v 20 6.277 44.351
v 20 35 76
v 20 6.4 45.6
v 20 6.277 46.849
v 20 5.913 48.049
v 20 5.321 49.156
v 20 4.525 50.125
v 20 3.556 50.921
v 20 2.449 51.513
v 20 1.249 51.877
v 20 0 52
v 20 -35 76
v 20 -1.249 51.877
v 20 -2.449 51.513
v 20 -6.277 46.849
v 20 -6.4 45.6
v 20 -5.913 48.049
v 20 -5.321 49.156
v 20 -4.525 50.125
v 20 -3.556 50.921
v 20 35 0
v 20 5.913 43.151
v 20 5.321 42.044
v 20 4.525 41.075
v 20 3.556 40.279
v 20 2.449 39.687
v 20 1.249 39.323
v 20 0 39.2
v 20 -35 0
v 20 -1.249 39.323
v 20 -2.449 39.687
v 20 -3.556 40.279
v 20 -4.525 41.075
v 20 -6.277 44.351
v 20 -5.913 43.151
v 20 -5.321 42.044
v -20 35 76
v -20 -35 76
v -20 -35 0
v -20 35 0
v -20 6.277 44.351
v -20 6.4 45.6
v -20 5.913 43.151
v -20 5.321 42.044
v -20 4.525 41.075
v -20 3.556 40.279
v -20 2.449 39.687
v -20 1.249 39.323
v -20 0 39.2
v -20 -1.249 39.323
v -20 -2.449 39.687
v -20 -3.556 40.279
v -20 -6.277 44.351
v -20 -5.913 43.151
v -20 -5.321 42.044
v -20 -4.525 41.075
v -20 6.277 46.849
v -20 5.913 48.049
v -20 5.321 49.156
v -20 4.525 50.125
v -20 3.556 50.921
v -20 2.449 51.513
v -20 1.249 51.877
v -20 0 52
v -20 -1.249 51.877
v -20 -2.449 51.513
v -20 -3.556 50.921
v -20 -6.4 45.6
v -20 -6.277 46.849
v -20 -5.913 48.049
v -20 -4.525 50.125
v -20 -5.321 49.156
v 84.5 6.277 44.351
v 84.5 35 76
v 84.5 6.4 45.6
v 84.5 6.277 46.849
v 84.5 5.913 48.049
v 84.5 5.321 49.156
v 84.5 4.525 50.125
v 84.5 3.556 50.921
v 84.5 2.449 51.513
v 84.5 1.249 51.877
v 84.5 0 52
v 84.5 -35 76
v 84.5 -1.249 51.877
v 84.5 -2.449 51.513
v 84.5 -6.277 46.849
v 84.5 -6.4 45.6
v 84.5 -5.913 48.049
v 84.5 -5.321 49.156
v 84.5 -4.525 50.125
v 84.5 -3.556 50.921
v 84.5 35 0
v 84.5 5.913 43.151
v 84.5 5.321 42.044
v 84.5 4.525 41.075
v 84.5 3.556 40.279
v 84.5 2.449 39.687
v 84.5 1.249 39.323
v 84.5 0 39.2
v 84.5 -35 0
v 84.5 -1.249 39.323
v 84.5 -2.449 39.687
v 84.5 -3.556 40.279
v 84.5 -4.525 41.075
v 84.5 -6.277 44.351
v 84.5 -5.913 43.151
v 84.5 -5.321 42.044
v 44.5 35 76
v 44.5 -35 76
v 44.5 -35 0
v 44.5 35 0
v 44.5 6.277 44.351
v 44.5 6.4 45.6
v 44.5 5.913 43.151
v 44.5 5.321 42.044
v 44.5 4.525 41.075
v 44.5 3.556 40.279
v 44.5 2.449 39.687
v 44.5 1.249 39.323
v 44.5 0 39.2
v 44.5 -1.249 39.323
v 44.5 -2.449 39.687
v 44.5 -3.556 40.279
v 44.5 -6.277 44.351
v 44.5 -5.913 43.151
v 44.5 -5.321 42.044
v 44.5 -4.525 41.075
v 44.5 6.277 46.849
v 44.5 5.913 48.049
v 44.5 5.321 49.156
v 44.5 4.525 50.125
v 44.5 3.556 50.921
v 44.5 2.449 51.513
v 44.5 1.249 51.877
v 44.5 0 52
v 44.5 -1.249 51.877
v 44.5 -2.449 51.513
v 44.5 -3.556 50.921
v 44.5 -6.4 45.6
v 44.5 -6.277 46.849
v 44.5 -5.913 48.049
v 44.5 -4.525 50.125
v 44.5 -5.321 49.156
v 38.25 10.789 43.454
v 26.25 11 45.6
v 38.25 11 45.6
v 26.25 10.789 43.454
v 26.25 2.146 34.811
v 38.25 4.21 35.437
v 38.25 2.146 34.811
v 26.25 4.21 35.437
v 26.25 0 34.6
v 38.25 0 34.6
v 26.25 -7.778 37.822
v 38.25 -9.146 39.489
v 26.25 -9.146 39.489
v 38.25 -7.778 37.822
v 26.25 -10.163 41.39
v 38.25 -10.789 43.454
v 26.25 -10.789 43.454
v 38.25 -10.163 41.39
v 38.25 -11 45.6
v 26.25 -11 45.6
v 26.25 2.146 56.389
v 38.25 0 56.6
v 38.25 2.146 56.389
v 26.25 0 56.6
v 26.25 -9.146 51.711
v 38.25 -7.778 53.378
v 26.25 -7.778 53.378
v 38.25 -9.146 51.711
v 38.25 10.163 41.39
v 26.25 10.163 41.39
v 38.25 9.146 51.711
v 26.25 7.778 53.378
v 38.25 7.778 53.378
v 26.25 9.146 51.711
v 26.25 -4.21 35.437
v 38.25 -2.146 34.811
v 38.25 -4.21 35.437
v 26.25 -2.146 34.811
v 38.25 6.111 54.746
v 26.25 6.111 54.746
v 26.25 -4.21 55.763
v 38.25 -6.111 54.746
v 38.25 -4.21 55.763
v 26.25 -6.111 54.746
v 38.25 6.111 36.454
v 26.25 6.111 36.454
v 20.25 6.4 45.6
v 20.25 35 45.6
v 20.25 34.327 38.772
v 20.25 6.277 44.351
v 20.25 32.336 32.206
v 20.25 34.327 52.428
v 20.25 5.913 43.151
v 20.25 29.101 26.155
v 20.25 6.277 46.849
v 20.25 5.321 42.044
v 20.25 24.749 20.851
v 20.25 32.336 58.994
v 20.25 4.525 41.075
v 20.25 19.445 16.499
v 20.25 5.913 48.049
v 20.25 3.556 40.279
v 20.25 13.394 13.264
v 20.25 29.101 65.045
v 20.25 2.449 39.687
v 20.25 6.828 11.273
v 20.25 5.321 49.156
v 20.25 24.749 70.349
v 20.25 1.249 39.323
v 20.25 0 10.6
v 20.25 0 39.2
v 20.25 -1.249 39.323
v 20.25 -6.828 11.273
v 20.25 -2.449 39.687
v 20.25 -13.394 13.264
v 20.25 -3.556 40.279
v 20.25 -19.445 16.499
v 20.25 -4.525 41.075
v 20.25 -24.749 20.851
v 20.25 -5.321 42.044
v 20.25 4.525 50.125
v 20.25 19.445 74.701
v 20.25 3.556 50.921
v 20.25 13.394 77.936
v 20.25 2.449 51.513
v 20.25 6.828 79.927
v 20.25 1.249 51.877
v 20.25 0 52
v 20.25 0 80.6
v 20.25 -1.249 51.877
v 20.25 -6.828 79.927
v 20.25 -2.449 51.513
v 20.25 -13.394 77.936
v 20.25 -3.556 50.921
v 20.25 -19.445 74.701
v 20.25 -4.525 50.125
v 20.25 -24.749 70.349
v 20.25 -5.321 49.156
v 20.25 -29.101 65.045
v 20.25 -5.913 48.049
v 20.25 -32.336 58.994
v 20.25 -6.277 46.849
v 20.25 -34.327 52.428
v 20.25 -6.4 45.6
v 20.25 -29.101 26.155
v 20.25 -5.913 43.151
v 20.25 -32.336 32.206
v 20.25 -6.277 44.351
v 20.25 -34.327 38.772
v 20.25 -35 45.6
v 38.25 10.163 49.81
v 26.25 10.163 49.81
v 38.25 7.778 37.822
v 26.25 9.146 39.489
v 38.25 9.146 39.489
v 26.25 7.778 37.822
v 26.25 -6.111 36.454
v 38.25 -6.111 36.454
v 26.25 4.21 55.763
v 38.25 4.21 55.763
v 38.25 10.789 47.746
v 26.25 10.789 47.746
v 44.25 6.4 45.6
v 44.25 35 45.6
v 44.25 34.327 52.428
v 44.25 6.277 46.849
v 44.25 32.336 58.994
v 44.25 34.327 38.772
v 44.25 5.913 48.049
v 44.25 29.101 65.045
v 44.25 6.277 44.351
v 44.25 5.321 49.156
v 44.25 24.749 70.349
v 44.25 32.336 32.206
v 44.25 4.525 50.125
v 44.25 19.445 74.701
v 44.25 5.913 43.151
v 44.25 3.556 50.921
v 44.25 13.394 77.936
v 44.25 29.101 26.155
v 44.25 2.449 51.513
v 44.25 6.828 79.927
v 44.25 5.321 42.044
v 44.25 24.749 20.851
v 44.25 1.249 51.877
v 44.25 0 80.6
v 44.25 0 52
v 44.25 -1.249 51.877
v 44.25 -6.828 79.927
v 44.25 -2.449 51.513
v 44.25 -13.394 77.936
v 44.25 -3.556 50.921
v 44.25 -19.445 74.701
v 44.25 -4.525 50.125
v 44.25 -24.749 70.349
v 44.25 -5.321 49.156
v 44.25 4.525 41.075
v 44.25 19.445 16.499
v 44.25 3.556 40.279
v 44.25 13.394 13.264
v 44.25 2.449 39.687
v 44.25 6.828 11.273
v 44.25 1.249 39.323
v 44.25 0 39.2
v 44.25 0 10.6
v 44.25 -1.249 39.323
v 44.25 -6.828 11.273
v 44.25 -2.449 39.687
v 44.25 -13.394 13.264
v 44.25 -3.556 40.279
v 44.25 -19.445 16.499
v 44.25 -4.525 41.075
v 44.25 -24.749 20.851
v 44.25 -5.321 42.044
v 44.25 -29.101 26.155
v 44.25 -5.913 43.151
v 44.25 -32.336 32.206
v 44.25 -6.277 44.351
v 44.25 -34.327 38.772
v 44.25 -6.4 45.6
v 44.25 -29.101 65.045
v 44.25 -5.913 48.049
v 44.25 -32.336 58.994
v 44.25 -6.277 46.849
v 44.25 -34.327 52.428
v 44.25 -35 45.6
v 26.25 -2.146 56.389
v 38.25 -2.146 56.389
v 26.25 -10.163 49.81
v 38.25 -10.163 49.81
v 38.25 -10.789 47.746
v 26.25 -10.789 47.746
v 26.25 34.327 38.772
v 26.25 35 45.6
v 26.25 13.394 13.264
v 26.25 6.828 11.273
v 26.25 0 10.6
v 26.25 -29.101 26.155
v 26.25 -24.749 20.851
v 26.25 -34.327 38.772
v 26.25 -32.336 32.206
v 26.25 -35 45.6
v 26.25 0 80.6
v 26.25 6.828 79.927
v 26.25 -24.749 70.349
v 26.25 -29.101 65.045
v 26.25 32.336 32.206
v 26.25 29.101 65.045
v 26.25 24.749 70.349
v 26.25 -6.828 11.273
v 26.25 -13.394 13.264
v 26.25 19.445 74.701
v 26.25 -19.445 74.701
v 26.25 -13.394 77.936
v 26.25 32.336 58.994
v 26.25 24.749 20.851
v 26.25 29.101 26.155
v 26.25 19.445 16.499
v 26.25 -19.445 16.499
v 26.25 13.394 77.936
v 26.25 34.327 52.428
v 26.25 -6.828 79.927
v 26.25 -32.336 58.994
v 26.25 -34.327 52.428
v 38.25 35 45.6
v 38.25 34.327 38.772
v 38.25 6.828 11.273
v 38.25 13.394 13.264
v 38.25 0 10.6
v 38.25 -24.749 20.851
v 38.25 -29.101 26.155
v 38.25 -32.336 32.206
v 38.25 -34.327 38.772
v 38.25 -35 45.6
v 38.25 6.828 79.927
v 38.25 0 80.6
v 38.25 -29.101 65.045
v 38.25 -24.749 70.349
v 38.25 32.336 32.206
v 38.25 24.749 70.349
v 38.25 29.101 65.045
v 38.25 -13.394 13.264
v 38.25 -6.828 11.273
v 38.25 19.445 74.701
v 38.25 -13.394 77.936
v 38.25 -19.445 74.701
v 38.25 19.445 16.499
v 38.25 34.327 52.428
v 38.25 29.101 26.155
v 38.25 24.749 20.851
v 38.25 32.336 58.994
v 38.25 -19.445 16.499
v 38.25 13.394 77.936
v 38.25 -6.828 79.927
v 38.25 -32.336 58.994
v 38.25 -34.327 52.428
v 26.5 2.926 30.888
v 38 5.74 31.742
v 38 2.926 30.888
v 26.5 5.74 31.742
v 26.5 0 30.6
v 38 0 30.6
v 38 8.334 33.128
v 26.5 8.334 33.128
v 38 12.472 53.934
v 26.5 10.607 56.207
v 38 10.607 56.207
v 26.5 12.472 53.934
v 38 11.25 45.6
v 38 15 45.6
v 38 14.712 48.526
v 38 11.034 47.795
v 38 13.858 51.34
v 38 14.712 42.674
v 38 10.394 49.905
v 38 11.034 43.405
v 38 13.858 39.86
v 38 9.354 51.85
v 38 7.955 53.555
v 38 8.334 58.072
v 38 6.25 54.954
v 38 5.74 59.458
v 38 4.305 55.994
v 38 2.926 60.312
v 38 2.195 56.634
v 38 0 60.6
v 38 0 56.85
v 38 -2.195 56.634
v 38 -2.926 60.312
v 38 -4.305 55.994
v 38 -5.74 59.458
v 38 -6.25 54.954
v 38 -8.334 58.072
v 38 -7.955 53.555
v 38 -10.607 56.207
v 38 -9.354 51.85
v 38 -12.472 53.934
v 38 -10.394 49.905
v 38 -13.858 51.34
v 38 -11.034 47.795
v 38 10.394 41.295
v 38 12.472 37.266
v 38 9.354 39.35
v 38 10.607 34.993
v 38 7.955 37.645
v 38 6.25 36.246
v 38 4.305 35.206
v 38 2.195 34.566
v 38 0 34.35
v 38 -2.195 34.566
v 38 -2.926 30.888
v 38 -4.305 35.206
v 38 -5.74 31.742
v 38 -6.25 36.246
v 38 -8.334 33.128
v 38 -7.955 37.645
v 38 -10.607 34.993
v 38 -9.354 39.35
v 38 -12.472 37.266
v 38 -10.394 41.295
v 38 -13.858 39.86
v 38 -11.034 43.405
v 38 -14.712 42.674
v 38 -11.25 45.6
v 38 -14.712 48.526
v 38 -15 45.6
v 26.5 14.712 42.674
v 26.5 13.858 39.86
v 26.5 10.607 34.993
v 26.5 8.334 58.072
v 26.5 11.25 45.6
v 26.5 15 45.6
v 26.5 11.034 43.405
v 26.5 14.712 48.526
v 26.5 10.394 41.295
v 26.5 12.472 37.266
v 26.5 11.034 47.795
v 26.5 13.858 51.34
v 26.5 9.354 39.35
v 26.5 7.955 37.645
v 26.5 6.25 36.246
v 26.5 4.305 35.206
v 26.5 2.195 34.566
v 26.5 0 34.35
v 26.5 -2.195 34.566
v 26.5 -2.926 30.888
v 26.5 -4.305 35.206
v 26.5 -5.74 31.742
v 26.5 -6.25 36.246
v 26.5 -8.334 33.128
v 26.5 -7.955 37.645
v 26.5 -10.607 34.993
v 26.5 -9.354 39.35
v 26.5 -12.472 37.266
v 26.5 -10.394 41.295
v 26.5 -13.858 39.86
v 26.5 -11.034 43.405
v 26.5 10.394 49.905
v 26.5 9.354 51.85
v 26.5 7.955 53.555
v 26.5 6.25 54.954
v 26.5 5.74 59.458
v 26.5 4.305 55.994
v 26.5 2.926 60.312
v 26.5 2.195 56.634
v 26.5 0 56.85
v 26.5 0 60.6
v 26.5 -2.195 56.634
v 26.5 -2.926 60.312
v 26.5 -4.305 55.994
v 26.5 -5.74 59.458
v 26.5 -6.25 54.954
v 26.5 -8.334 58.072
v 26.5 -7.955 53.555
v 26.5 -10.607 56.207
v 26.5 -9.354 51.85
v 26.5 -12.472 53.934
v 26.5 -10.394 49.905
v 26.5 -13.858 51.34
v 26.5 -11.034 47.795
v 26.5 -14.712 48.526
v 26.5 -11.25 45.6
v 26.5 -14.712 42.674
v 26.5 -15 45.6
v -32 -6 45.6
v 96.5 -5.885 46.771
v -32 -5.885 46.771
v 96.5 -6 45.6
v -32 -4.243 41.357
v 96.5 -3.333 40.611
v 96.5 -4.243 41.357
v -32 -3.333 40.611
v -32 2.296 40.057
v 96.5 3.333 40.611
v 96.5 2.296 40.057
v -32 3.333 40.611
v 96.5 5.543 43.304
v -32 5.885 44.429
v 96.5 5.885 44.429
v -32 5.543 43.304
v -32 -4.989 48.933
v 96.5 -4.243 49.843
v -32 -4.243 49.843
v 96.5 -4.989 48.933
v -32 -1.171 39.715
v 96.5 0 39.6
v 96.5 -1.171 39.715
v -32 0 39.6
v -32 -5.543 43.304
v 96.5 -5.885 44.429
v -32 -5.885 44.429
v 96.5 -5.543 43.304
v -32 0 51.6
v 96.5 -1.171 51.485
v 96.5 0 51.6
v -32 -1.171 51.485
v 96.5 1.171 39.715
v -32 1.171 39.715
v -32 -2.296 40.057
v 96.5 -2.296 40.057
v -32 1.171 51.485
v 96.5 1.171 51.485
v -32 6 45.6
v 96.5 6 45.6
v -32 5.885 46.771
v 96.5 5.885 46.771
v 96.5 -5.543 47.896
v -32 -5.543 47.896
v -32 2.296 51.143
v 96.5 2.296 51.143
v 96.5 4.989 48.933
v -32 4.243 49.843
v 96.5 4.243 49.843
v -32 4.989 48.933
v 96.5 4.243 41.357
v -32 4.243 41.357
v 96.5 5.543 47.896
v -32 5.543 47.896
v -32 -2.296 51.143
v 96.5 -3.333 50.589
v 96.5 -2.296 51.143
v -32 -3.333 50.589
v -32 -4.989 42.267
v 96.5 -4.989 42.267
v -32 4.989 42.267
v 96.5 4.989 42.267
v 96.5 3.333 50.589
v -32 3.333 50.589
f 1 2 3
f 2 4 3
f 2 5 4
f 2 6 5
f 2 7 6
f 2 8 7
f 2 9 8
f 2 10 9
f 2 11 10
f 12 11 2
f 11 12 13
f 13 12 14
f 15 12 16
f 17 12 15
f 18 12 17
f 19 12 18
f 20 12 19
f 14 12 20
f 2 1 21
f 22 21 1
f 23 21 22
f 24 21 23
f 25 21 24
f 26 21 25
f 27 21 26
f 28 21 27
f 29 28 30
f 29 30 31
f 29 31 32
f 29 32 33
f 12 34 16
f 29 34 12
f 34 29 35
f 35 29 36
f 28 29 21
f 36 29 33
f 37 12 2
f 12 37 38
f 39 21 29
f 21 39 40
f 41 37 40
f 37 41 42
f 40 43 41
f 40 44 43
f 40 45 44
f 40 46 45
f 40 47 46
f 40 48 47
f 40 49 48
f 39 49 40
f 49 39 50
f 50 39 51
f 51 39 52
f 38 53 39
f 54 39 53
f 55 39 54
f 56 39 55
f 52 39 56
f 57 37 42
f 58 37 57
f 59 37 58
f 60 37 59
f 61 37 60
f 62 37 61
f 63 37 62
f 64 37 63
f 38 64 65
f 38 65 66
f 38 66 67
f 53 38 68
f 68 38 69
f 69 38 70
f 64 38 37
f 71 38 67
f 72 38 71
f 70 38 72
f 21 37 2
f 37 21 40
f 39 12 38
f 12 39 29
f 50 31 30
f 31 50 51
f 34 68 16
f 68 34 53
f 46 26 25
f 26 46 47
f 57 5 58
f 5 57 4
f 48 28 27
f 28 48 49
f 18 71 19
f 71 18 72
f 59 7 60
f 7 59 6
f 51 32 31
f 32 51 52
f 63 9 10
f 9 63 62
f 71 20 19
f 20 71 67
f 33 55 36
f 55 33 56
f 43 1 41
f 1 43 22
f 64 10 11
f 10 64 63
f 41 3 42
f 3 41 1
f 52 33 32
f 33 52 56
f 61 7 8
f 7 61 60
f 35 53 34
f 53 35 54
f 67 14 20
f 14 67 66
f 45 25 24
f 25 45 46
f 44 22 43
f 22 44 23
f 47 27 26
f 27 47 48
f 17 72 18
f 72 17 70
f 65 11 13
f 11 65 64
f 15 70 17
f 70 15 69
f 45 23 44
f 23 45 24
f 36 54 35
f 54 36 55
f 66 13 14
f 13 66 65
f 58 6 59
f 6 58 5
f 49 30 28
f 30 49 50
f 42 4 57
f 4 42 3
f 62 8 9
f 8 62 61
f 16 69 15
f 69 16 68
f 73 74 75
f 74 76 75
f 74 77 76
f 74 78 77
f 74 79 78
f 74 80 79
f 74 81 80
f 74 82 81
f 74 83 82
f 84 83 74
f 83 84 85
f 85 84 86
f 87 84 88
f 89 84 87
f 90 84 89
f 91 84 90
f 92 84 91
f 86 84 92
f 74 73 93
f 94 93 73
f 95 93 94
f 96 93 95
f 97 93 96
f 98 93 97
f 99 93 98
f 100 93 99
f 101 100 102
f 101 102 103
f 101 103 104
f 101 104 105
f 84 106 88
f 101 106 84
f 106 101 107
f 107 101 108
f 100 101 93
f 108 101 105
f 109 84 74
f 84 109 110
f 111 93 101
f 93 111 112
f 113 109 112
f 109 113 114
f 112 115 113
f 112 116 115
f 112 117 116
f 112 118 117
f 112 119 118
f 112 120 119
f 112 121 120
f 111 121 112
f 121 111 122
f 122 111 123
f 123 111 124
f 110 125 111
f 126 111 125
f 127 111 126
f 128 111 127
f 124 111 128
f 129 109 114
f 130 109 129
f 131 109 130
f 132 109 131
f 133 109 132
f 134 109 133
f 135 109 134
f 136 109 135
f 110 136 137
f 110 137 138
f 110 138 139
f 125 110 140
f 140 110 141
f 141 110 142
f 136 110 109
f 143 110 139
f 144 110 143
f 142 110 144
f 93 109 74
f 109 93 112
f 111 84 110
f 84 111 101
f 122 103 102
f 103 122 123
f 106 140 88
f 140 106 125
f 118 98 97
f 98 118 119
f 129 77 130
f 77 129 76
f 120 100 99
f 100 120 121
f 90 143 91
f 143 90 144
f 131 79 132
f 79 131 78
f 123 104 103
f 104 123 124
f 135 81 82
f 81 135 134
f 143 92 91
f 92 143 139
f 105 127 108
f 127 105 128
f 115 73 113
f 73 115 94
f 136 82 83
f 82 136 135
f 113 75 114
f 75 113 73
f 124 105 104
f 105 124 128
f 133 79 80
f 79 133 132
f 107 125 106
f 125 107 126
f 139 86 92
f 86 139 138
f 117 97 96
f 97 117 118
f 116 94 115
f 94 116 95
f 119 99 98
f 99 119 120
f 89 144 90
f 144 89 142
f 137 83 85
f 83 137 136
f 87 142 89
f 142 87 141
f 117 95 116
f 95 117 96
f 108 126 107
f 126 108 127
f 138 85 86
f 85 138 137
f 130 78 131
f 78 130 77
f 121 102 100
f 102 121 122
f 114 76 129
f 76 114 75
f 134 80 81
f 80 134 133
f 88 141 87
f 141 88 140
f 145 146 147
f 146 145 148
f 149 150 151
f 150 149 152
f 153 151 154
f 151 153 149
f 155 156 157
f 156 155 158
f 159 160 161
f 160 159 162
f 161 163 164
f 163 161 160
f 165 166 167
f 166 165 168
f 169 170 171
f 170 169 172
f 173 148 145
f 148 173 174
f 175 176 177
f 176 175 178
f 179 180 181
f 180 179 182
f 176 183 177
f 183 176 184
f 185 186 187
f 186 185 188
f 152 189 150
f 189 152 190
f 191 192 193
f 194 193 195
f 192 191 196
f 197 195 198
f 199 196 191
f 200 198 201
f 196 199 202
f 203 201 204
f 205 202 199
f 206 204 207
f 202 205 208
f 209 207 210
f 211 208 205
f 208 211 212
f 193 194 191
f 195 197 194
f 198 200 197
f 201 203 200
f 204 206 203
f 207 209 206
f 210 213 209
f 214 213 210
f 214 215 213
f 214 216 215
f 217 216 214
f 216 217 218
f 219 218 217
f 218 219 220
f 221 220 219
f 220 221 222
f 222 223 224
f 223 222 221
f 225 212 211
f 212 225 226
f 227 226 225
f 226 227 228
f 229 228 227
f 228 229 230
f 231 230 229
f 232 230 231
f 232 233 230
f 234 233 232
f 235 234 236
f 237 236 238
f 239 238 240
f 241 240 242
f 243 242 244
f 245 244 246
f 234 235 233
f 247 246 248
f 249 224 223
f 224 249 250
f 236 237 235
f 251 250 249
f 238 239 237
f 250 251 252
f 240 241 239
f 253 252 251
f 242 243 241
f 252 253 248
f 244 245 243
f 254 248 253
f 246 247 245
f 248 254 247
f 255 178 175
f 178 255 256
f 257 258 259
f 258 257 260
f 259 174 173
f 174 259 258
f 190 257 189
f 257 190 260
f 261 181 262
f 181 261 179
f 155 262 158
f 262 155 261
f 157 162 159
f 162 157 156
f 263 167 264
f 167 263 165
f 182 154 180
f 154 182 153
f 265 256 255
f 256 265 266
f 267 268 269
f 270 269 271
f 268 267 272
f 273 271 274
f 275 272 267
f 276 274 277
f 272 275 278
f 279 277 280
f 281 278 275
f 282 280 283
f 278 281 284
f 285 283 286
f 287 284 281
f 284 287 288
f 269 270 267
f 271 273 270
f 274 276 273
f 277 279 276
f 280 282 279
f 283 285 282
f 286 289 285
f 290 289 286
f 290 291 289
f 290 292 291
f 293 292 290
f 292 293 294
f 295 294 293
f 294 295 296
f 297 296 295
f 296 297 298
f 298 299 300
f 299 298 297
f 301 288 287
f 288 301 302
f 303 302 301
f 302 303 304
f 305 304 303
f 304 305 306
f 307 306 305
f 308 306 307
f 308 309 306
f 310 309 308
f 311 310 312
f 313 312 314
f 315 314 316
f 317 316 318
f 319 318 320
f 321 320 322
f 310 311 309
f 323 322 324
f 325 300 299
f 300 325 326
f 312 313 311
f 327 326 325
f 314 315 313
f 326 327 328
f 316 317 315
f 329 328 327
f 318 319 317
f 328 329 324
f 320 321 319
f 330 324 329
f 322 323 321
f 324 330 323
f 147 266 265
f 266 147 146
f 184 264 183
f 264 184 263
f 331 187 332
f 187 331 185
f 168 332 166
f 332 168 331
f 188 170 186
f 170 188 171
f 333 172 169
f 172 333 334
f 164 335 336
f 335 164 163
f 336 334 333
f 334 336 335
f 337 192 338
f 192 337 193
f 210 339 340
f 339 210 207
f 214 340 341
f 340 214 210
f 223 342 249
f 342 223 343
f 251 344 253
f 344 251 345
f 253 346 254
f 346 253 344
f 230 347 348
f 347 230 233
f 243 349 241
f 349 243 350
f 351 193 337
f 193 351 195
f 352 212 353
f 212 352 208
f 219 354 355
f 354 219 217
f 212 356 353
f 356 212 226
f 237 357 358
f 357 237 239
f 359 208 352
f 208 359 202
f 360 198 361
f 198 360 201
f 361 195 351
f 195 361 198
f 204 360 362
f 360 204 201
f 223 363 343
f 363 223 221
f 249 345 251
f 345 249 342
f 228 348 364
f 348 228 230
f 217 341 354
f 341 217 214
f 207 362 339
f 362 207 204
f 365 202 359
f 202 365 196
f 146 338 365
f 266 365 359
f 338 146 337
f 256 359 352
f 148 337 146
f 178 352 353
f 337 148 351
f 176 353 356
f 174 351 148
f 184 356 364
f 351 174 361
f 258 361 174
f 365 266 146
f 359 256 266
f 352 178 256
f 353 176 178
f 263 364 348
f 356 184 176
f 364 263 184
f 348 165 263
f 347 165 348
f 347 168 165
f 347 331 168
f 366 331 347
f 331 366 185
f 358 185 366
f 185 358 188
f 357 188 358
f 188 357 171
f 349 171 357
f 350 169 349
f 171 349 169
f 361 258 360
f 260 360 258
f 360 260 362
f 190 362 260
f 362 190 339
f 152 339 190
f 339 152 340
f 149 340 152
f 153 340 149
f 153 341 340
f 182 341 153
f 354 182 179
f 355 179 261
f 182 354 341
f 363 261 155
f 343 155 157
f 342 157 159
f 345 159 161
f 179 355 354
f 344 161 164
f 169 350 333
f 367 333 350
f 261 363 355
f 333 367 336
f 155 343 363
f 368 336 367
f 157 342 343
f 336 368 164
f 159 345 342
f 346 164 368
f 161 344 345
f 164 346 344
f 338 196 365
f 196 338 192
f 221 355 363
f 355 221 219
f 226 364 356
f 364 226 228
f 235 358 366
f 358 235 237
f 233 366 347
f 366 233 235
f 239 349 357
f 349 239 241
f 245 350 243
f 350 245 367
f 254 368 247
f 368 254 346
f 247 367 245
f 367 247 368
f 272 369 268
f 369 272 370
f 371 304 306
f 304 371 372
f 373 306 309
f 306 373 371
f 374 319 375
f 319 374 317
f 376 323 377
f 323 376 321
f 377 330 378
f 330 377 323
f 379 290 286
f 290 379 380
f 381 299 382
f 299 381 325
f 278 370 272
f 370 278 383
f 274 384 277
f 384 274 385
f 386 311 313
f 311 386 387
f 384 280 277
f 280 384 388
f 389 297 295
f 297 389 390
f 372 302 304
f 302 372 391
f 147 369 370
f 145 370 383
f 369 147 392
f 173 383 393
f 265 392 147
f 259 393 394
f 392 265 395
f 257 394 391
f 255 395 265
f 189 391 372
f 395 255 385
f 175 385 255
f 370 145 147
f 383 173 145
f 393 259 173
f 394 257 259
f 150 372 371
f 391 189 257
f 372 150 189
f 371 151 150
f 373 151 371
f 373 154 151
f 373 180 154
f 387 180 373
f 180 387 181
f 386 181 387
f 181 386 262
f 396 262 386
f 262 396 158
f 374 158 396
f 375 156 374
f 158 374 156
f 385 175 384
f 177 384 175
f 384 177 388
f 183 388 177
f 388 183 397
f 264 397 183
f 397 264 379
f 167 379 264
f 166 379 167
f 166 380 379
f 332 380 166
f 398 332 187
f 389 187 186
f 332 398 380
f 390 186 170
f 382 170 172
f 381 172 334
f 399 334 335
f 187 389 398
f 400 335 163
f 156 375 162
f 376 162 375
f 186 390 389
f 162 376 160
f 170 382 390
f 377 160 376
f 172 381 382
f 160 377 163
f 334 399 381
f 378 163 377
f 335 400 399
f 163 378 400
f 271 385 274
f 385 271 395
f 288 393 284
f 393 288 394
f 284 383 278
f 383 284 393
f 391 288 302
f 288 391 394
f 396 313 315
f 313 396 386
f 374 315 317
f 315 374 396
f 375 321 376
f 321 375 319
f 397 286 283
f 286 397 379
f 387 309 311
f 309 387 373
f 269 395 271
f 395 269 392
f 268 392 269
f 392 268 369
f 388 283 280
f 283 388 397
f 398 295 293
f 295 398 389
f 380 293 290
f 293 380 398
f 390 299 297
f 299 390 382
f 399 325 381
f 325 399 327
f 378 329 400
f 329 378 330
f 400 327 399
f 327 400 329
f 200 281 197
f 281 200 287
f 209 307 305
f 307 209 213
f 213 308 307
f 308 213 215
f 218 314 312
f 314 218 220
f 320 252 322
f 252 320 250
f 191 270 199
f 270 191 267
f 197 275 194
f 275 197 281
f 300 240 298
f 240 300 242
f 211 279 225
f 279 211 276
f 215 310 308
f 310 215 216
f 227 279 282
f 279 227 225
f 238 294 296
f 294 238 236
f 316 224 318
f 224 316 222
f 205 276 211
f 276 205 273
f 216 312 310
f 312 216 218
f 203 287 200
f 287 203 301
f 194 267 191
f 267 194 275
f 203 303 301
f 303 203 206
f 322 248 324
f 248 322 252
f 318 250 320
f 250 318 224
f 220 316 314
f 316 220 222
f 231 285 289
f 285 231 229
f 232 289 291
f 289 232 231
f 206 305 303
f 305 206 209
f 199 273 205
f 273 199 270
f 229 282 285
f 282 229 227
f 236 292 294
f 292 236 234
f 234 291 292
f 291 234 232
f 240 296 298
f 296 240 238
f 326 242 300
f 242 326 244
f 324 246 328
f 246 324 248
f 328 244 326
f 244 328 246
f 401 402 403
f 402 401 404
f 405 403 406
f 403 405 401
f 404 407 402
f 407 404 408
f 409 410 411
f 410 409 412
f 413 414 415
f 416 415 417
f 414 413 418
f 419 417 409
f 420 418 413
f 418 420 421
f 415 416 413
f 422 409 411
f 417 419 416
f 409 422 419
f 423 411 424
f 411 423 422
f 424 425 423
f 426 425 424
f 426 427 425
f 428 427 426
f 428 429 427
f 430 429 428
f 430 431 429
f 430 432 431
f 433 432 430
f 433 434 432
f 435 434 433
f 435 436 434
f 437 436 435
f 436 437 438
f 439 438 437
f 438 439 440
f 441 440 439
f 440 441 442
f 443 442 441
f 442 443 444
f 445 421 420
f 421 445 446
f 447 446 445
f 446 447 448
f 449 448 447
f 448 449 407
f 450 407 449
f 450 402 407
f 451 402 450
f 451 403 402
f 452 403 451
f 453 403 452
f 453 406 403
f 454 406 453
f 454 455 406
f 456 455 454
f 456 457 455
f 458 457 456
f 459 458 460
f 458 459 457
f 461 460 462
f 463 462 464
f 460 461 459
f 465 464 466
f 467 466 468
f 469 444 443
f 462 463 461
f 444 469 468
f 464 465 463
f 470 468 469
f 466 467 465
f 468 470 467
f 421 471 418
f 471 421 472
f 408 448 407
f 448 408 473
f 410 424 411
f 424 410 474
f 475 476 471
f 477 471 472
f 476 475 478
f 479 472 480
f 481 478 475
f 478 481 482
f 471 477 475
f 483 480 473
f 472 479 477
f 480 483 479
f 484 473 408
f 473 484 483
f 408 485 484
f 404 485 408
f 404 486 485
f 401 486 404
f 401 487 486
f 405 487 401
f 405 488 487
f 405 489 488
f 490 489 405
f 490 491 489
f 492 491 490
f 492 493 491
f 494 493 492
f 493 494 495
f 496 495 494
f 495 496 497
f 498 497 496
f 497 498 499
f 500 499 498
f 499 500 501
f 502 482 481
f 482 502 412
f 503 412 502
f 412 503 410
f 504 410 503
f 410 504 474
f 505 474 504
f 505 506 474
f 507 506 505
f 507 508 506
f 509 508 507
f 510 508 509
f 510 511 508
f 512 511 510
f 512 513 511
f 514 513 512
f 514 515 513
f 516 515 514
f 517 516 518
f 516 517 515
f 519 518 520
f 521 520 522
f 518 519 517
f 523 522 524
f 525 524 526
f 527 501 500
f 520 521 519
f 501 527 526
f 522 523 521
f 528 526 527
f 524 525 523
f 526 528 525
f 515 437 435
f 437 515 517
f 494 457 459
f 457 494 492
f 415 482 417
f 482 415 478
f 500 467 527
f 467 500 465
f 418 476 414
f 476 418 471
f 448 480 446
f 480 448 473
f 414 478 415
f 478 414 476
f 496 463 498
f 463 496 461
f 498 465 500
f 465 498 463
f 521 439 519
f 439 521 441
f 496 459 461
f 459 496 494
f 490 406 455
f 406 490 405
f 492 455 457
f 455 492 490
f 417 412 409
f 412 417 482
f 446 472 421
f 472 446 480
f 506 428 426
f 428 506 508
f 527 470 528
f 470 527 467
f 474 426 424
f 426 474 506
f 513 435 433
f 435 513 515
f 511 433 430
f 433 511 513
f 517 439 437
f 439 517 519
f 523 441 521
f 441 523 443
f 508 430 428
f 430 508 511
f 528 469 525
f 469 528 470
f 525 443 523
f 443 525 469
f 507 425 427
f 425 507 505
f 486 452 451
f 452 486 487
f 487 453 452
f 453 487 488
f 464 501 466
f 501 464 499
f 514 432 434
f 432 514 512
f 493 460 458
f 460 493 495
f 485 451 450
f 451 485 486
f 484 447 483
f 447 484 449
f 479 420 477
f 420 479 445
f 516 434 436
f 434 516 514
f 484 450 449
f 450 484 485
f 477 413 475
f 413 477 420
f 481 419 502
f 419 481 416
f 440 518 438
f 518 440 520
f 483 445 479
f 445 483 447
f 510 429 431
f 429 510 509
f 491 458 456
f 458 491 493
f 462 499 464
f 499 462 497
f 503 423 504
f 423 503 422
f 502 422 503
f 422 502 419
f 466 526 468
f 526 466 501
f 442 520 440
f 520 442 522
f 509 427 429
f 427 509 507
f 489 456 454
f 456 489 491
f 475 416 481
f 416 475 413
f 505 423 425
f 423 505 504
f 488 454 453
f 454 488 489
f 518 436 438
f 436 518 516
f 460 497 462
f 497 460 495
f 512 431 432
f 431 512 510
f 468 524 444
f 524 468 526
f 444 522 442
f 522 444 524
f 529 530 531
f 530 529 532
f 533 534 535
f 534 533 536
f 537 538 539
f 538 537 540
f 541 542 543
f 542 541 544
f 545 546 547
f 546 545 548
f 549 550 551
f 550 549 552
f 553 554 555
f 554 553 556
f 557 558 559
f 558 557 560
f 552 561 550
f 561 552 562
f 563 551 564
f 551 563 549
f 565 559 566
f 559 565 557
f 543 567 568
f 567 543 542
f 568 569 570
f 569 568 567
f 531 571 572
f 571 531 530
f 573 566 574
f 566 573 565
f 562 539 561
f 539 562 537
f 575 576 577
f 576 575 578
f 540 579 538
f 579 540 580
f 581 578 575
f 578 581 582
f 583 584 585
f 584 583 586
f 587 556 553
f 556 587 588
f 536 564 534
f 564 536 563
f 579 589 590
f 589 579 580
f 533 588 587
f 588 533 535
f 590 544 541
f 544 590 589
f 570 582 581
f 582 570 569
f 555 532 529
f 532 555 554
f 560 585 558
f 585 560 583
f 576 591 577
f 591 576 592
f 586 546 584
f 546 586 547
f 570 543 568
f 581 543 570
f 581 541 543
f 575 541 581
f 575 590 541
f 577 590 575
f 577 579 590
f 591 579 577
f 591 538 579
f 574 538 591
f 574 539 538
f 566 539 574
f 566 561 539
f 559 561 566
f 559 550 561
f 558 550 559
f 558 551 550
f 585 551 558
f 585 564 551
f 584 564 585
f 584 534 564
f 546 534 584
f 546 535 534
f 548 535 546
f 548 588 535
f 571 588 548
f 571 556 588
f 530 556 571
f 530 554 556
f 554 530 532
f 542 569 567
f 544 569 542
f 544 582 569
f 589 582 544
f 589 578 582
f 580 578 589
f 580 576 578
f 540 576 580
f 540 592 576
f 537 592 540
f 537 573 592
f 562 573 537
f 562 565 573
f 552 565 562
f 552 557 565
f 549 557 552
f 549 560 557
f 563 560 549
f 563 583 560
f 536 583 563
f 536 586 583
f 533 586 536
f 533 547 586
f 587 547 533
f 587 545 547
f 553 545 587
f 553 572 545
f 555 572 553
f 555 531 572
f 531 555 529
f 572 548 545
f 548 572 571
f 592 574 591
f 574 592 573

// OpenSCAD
$fn = 32;

// ------------------------------------------------------------------------
// Pulley assembly: d70 pulley with a belt, shaft d12
// Every part is its own module, assembly() places them once.
// ------------------------------------------------------------------------

// --- part 1 ---
module support1() {
  difference() {
    translate([-20, -35, 0]) cube([40, 70, 76]);
    translate([0, 0, 45.6]) rotate([0, 90, 0]) cylinder(h = 42, d = 12.8, center = true);
  }
}

// --- part 2 ---
module support2() {
  difference() {
    translate([-20, -35, 0]) cube([40, 70, 76]);
    translate([0, 0, 45.6]) rotate([0, 90, 0]) cylinder(h = 42, d = 12.8, center = true);
  }
}

// --- part 3 ---
module shaft() {
  translate([0, 0, -64.25]) cylinder(h = 128.5, d = 12);
}

// --- part 4 ---
module pulley() {
  difference() {
    union() {
      cylinder(h = 24, d = 22);
      cylinder(h = 6, d = 70);
      translate([0, 0, 18]) cylinder(h = 6, d = 70);
    }
    translate([0, 0, -1]) cylinder(h = 26, d = 12.8);
  }
}

// --- part 5 ---
module belt() {
  difference() {
      translate([0, 0, 0]) cylinder(h = 11.5, d = 30);
      translate([0, 0, -1]) cylinder(h = 13.5, d = 22.5);
    }
}

// --- assembly ---
module assembly() {
  translate([0, 0, 0]) rotate([0, 0, 0]) support1();
  translate([64.5, 0, 0]) rotate([0, 0, 0]) support2();
  translate([32.25, 0, 45.6]) rotate([0, 90, 0]) shaft();
  translate([20.25, 0, 45.6]) rotate([0, 90, 0]) pulley();
  translate([26.5, 0, 45.6]) rotate([0, 90, 0]) belt();
}

assembly();
